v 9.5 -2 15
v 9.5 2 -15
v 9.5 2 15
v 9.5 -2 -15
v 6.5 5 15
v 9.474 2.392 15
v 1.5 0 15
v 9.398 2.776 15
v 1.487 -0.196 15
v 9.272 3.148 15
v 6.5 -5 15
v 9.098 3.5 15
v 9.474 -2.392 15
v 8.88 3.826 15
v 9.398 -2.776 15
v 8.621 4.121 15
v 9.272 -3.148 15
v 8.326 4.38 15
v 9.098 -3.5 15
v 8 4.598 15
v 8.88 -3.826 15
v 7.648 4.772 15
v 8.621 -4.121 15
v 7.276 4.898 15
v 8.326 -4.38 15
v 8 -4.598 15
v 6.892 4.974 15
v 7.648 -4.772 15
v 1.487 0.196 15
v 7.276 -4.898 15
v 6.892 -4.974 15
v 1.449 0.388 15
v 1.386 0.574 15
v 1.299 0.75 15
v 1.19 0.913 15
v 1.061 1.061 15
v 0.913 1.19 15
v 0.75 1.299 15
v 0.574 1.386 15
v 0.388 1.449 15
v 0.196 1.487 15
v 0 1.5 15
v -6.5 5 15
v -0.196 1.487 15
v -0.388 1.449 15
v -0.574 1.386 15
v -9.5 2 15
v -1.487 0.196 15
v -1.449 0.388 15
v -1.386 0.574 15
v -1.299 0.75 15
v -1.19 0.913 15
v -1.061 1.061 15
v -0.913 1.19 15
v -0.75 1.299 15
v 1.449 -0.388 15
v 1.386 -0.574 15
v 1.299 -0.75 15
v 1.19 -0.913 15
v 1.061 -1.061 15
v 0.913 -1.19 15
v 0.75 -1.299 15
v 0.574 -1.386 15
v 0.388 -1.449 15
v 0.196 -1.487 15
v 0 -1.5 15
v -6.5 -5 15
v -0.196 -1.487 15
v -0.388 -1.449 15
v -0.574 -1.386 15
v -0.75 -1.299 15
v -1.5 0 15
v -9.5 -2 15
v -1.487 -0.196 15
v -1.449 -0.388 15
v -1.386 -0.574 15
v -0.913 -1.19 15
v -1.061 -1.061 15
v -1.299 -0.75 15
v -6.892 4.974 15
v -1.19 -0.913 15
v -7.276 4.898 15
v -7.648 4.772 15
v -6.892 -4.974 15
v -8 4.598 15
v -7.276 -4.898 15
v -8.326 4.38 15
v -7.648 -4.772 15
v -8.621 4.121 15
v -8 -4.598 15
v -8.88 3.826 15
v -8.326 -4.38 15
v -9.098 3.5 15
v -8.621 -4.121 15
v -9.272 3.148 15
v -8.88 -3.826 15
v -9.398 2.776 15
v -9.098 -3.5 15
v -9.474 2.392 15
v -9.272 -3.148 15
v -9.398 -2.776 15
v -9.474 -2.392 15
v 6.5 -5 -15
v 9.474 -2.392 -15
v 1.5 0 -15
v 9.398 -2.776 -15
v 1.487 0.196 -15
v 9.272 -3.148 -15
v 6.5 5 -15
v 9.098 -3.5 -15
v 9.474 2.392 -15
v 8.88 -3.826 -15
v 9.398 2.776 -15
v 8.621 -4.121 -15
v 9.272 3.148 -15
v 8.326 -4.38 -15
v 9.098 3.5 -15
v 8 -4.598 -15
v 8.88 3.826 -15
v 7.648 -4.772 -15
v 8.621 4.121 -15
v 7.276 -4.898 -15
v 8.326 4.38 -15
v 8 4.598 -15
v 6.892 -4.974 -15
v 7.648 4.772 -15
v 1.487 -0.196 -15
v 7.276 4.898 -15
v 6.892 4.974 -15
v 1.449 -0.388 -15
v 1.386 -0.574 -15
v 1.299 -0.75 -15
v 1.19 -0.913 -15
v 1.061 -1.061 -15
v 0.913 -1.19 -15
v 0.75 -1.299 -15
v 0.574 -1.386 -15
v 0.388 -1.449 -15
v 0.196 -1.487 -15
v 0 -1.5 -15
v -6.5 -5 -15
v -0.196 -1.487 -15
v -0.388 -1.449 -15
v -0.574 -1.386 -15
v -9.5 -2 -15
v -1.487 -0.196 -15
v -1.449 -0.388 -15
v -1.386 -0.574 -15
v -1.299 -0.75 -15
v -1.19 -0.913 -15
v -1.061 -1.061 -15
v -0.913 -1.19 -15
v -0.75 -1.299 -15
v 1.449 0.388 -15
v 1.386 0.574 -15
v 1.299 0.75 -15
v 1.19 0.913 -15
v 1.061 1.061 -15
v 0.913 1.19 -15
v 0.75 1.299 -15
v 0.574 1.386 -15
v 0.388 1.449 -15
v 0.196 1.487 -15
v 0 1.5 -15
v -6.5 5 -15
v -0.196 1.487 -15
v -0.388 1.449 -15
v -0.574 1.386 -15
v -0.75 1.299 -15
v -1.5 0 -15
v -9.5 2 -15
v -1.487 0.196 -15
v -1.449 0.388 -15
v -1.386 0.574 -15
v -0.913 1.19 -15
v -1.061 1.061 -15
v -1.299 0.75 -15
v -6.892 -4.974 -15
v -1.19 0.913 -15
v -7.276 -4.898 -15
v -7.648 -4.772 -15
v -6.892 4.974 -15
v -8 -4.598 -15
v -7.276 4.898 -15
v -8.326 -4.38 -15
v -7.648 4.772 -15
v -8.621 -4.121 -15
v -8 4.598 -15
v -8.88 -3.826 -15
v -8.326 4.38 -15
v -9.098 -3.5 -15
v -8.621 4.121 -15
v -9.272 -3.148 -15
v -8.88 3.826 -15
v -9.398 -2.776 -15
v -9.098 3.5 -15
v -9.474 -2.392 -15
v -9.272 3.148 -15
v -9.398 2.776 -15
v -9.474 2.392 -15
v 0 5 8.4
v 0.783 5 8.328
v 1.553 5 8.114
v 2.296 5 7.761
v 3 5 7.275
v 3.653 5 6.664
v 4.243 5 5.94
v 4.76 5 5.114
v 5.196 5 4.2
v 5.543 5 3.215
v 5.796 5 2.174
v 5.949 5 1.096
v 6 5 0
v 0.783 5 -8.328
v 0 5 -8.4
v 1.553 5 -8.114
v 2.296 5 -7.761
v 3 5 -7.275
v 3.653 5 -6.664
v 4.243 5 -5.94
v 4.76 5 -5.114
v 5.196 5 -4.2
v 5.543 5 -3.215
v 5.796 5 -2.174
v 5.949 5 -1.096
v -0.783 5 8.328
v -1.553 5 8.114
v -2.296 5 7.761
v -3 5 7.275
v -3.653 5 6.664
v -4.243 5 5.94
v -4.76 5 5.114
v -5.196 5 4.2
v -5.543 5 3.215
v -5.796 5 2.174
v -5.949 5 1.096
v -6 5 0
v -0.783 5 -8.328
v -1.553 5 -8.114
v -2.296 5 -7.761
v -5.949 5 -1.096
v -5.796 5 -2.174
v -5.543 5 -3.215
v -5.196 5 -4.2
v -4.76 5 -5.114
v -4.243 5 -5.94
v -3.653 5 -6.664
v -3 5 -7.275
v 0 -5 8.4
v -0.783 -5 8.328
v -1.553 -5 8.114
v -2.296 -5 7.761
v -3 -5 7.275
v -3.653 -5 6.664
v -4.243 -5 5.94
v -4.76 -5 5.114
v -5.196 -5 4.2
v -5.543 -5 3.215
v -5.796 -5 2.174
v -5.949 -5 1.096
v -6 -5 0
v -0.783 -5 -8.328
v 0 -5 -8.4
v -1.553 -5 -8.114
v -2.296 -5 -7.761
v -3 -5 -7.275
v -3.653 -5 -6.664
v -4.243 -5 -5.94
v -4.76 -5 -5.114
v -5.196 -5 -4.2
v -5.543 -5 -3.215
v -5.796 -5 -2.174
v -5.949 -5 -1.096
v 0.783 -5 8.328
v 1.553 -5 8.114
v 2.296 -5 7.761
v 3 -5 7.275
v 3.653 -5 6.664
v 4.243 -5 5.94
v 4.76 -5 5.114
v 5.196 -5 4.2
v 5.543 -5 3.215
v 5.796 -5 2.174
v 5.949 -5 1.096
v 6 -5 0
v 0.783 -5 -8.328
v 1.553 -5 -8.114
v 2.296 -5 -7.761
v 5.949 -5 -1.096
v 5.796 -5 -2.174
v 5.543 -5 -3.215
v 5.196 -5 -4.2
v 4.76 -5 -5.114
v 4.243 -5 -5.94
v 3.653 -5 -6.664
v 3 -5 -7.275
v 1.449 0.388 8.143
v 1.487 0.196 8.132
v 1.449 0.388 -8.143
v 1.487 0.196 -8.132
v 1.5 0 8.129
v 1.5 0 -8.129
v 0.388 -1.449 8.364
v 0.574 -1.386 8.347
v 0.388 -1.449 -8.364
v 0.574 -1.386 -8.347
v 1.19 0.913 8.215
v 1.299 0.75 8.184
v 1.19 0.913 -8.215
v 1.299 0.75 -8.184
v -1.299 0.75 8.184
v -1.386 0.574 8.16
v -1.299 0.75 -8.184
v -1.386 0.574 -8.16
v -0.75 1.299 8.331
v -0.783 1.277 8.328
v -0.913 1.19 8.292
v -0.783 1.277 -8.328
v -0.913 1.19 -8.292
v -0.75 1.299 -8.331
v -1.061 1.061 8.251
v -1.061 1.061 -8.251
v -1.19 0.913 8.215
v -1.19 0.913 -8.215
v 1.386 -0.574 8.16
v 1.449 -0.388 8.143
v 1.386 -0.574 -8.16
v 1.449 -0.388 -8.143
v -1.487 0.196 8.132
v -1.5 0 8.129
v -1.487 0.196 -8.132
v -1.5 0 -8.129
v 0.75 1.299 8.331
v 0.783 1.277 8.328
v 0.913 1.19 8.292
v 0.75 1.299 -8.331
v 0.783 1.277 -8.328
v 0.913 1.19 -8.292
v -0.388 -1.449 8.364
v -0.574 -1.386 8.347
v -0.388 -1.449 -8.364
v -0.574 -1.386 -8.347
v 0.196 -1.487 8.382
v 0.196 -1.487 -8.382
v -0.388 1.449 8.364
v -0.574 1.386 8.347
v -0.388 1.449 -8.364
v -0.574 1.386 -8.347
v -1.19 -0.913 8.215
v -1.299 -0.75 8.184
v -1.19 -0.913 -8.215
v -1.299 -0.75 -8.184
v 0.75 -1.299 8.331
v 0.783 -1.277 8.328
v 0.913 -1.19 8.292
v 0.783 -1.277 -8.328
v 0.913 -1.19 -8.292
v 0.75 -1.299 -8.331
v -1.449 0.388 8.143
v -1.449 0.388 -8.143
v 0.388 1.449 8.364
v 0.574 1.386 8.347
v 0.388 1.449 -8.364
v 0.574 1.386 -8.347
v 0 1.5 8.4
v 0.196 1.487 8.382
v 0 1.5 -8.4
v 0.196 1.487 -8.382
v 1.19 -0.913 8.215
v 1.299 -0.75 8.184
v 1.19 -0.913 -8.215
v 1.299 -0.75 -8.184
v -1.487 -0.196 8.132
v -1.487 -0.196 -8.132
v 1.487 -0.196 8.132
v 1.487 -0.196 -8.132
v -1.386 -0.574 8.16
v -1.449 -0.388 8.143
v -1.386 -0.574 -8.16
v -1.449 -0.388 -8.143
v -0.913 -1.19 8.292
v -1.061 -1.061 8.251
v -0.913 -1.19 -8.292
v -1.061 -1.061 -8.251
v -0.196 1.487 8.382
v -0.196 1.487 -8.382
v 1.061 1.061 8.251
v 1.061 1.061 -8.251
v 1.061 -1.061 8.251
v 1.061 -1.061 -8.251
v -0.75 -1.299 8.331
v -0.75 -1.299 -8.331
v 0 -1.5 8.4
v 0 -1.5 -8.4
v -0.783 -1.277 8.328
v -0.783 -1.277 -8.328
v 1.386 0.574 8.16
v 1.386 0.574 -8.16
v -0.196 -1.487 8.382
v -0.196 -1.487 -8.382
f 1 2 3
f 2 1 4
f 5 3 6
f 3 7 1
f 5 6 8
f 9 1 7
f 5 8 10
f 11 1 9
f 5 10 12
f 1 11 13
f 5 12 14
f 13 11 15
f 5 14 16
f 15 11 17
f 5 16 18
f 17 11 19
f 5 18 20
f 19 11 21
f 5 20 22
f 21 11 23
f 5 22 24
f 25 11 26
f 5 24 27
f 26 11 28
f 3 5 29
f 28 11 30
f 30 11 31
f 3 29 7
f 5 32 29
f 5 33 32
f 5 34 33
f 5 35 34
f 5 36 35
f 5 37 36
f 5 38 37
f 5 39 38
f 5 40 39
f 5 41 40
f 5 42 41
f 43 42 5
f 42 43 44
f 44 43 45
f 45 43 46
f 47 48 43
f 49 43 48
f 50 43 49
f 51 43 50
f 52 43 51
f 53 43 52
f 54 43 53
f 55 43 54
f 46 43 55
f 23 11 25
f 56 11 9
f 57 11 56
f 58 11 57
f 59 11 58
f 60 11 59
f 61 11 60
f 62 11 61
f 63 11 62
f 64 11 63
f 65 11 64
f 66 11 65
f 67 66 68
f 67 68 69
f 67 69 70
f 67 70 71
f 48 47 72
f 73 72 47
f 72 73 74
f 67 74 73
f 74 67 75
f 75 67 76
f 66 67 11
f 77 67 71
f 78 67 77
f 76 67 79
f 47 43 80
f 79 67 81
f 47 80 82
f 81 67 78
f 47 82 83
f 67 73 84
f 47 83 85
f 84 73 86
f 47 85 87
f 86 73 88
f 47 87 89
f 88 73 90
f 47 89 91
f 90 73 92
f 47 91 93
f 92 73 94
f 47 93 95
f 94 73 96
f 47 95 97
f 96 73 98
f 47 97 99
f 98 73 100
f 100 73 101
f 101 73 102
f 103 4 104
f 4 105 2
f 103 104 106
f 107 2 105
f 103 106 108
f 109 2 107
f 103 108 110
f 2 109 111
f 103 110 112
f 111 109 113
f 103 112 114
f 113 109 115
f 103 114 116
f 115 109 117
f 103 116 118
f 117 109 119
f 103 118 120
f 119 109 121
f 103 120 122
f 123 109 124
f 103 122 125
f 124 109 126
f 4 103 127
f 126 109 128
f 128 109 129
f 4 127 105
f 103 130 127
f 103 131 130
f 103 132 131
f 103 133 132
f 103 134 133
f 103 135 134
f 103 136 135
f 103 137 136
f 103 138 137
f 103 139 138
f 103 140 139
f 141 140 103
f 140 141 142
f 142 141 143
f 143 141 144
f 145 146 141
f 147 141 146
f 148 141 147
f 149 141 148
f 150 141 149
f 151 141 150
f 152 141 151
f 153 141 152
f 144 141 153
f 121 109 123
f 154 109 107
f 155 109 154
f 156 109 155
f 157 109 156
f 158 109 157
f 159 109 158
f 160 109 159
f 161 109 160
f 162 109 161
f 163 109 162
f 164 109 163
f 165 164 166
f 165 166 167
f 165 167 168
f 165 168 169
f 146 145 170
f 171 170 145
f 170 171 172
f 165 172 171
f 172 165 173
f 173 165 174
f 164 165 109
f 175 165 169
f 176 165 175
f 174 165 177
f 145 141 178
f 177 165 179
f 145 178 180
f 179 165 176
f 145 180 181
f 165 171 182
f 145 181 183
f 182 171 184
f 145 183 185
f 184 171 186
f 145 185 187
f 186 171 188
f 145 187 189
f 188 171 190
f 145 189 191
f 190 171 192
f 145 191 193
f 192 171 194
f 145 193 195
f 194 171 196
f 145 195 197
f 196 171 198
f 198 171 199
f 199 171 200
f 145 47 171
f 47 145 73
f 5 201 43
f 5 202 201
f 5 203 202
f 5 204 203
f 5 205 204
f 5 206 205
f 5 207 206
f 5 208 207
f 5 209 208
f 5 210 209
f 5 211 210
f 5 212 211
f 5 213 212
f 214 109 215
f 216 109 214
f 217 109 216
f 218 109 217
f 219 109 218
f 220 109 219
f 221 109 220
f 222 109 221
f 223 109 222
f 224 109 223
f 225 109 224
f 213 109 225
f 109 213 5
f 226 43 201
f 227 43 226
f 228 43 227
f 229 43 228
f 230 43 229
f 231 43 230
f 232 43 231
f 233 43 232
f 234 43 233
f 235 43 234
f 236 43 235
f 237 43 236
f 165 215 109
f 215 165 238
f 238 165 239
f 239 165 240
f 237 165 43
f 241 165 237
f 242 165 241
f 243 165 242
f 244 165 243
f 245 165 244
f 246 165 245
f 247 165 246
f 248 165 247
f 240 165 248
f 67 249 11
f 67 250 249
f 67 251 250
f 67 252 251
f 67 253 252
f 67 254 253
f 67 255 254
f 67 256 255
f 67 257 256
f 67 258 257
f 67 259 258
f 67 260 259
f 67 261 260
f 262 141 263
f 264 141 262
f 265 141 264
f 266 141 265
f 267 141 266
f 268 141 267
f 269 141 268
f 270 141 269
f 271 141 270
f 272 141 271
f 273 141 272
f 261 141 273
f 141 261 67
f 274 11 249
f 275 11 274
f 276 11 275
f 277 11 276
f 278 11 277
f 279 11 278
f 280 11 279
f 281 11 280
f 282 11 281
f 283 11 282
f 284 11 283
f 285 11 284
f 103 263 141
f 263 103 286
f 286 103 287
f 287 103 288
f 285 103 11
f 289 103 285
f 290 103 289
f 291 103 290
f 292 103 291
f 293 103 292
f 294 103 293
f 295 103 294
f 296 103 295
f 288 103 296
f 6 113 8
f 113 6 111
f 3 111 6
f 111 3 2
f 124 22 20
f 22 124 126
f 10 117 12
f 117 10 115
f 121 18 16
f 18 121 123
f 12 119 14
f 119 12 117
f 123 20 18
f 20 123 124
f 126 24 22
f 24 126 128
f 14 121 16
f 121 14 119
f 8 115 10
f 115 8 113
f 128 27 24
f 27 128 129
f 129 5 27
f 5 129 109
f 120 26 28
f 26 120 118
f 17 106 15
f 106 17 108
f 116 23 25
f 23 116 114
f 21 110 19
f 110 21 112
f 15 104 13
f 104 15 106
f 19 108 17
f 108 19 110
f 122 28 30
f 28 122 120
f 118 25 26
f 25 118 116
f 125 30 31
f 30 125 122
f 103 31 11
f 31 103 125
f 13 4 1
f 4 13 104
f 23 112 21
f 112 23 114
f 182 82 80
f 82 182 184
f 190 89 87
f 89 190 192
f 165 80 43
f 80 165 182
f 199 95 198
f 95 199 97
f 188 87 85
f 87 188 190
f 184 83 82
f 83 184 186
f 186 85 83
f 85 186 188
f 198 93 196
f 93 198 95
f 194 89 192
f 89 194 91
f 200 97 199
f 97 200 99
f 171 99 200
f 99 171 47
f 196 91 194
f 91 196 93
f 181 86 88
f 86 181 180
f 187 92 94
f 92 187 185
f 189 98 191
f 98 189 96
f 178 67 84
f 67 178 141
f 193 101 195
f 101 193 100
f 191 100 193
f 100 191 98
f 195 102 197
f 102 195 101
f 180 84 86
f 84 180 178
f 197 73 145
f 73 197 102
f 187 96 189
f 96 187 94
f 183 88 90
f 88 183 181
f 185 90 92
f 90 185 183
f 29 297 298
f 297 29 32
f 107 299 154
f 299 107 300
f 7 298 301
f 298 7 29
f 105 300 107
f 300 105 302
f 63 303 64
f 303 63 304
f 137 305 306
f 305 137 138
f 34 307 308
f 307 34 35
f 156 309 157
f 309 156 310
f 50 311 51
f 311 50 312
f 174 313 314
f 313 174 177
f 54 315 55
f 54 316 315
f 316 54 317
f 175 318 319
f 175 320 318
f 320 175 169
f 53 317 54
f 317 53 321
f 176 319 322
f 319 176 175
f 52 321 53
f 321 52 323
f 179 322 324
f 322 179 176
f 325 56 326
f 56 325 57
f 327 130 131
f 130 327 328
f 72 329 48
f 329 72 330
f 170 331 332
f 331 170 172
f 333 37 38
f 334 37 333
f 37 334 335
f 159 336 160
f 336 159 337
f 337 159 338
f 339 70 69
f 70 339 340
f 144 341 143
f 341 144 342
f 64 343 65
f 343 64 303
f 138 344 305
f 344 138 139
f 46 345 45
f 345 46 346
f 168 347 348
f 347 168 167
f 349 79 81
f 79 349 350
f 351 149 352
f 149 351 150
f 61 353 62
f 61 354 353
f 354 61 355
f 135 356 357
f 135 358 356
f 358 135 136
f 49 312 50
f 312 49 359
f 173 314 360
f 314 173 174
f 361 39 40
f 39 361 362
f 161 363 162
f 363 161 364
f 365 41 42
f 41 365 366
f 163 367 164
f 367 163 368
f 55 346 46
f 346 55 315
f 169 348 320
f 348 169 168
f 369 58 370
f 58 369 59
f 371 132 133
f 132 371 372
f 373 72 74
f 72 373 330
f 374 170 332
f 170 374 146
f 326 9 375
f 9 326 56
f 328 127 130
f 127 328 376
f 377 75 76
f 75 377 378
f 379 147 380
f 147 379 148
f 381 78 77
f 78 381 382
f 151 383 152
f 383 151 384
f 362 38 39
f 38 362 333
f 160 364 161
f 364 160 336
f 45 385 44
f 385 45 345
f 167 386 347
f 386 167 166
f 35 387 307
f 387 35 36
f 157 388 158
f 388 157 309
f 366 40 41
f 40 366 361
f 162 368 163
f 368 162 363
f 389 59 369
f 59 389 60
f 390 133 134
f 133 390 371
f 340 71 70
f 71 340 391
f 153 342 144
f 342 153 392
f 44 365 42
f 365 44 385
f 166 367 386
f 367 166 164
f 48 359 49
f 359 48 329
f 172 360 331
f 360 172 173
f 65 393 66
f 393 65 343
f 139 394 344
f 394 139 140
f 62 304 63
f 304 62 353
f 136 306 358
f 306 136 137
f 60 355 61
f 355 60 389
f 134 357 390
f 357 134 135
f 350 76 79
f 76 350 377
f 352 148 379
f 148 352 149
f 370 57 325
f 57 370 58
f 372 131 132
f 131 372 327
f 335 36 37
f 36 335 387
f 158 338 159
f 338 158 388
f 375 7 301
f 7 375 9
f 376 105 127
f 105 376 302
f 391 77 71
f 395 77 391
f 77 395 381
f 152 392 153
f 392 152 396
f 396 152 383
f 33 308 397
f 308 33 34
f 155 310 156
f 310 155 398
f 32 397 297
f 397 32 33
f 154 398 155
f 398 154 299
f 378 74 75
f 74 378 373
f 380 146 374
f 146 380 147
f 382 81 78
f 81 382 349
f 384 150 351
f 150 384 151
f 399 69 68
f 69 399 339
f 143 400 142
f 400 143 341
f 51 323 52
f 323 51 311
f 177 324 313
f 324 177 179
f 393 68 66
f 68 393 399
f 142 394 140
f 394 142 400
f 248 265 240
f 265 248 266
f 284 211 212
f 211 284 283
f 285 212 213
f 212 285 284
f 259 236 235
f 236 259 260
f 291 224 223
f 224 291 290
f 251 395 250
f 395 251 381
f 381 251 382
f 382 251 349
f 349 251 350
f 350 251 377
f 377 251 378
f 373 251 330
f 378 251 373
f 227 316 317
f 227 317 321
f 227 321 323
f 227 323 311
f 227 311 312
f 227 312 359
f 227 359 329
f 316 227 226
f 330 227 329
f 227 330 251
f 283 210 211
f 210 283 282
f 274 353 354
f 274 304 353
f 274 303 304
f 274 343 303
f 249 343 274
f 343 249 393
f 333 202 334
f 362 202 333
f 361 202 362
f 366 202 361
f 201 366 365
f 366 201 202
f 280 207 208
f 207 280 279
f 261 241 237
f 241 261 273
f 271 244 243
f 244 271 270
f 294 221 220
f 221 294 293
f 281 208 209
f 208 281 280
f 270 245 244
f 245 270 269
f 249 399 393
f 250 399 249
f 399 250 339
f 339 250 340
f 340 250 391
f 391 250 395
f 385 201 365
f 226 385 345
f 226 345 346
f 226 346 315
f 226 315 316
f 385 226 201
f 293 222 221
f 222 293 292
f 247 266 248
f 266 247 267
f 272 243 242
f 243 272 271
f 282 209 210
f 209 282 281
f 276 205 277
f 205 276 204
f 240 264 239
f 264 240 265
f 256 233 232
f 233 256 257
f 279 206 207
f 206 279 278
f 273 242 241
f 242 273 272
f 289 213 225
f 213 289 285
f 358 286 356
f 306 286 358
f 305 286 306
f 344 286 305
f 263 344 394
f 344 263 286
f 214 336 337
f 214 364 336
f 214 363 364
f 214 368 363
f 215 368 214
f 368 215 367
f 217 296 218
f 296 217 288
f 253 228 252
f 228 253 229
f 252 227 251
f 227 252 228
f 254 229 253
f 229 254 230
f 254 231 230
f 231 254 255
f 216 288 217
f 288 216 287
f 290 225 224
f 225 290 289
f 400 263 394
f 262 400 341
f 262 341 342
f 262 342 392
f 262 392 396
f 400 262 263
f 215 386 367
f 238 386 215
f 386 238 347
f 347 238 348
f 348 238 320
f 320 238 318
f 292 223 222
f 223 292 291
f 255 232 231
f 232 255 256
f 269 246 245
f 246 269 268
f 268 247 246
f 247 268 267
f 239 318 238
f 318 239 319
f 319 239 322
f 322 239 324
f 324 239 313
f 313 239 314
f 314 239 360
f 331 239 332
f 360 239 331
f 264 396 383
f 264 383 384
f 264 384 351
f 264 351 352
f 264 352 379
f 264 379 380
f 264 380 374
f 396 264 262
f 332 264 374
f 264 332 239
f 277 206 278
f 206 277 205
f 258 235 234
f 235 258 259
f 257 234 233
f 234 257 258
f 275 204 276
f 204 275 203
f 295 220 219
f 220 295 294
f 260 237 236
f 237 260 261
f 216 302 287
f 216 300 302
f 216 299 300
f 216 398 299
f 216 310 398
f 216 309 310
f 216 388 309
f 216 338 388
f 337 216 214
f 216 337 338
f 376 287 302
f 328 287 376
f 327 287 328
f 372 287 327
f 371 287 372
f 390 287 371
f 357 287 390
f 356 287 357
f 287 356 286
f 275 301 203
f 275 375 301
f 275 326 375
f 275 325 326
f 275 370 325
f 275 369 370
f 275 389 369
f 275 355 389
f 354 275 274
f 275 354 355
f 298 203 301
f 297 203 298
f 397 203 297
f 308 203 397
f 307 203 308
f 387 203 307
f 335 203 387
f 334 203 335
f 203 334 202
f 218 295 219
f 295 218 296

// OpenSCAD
$fn=48;

module round_cube(x,y,z,r) 
{
    cube([x,y-2*r,z],center=true);
    cube([x-2*r,y,z],center=true);
    cube([x-2*r,y-2*r,z],center=true);
    
    translate([+x/2-r,+y/2-r,0]) cylinder(r=r,h=z,center=true);
    translate([+x/2-r,-y/2+r,0]) cylinder(r=r,h=z,center=true);
    translate([-x/2+r,+y/2-r,0]) cylinder(r=r,h=z,center=true);
    translate([-x/2+r,-y/2+r,0]) cylinder(r=r,h=z,center=true);
}   

difference() 
{
    round_cube(19,10,30,3);
    cylinder(d=3,h=33,center=true);
    scale([1,1,1.4]) rotate([90,0,0]) cylinder(d=12,h=20,center=true);
}
